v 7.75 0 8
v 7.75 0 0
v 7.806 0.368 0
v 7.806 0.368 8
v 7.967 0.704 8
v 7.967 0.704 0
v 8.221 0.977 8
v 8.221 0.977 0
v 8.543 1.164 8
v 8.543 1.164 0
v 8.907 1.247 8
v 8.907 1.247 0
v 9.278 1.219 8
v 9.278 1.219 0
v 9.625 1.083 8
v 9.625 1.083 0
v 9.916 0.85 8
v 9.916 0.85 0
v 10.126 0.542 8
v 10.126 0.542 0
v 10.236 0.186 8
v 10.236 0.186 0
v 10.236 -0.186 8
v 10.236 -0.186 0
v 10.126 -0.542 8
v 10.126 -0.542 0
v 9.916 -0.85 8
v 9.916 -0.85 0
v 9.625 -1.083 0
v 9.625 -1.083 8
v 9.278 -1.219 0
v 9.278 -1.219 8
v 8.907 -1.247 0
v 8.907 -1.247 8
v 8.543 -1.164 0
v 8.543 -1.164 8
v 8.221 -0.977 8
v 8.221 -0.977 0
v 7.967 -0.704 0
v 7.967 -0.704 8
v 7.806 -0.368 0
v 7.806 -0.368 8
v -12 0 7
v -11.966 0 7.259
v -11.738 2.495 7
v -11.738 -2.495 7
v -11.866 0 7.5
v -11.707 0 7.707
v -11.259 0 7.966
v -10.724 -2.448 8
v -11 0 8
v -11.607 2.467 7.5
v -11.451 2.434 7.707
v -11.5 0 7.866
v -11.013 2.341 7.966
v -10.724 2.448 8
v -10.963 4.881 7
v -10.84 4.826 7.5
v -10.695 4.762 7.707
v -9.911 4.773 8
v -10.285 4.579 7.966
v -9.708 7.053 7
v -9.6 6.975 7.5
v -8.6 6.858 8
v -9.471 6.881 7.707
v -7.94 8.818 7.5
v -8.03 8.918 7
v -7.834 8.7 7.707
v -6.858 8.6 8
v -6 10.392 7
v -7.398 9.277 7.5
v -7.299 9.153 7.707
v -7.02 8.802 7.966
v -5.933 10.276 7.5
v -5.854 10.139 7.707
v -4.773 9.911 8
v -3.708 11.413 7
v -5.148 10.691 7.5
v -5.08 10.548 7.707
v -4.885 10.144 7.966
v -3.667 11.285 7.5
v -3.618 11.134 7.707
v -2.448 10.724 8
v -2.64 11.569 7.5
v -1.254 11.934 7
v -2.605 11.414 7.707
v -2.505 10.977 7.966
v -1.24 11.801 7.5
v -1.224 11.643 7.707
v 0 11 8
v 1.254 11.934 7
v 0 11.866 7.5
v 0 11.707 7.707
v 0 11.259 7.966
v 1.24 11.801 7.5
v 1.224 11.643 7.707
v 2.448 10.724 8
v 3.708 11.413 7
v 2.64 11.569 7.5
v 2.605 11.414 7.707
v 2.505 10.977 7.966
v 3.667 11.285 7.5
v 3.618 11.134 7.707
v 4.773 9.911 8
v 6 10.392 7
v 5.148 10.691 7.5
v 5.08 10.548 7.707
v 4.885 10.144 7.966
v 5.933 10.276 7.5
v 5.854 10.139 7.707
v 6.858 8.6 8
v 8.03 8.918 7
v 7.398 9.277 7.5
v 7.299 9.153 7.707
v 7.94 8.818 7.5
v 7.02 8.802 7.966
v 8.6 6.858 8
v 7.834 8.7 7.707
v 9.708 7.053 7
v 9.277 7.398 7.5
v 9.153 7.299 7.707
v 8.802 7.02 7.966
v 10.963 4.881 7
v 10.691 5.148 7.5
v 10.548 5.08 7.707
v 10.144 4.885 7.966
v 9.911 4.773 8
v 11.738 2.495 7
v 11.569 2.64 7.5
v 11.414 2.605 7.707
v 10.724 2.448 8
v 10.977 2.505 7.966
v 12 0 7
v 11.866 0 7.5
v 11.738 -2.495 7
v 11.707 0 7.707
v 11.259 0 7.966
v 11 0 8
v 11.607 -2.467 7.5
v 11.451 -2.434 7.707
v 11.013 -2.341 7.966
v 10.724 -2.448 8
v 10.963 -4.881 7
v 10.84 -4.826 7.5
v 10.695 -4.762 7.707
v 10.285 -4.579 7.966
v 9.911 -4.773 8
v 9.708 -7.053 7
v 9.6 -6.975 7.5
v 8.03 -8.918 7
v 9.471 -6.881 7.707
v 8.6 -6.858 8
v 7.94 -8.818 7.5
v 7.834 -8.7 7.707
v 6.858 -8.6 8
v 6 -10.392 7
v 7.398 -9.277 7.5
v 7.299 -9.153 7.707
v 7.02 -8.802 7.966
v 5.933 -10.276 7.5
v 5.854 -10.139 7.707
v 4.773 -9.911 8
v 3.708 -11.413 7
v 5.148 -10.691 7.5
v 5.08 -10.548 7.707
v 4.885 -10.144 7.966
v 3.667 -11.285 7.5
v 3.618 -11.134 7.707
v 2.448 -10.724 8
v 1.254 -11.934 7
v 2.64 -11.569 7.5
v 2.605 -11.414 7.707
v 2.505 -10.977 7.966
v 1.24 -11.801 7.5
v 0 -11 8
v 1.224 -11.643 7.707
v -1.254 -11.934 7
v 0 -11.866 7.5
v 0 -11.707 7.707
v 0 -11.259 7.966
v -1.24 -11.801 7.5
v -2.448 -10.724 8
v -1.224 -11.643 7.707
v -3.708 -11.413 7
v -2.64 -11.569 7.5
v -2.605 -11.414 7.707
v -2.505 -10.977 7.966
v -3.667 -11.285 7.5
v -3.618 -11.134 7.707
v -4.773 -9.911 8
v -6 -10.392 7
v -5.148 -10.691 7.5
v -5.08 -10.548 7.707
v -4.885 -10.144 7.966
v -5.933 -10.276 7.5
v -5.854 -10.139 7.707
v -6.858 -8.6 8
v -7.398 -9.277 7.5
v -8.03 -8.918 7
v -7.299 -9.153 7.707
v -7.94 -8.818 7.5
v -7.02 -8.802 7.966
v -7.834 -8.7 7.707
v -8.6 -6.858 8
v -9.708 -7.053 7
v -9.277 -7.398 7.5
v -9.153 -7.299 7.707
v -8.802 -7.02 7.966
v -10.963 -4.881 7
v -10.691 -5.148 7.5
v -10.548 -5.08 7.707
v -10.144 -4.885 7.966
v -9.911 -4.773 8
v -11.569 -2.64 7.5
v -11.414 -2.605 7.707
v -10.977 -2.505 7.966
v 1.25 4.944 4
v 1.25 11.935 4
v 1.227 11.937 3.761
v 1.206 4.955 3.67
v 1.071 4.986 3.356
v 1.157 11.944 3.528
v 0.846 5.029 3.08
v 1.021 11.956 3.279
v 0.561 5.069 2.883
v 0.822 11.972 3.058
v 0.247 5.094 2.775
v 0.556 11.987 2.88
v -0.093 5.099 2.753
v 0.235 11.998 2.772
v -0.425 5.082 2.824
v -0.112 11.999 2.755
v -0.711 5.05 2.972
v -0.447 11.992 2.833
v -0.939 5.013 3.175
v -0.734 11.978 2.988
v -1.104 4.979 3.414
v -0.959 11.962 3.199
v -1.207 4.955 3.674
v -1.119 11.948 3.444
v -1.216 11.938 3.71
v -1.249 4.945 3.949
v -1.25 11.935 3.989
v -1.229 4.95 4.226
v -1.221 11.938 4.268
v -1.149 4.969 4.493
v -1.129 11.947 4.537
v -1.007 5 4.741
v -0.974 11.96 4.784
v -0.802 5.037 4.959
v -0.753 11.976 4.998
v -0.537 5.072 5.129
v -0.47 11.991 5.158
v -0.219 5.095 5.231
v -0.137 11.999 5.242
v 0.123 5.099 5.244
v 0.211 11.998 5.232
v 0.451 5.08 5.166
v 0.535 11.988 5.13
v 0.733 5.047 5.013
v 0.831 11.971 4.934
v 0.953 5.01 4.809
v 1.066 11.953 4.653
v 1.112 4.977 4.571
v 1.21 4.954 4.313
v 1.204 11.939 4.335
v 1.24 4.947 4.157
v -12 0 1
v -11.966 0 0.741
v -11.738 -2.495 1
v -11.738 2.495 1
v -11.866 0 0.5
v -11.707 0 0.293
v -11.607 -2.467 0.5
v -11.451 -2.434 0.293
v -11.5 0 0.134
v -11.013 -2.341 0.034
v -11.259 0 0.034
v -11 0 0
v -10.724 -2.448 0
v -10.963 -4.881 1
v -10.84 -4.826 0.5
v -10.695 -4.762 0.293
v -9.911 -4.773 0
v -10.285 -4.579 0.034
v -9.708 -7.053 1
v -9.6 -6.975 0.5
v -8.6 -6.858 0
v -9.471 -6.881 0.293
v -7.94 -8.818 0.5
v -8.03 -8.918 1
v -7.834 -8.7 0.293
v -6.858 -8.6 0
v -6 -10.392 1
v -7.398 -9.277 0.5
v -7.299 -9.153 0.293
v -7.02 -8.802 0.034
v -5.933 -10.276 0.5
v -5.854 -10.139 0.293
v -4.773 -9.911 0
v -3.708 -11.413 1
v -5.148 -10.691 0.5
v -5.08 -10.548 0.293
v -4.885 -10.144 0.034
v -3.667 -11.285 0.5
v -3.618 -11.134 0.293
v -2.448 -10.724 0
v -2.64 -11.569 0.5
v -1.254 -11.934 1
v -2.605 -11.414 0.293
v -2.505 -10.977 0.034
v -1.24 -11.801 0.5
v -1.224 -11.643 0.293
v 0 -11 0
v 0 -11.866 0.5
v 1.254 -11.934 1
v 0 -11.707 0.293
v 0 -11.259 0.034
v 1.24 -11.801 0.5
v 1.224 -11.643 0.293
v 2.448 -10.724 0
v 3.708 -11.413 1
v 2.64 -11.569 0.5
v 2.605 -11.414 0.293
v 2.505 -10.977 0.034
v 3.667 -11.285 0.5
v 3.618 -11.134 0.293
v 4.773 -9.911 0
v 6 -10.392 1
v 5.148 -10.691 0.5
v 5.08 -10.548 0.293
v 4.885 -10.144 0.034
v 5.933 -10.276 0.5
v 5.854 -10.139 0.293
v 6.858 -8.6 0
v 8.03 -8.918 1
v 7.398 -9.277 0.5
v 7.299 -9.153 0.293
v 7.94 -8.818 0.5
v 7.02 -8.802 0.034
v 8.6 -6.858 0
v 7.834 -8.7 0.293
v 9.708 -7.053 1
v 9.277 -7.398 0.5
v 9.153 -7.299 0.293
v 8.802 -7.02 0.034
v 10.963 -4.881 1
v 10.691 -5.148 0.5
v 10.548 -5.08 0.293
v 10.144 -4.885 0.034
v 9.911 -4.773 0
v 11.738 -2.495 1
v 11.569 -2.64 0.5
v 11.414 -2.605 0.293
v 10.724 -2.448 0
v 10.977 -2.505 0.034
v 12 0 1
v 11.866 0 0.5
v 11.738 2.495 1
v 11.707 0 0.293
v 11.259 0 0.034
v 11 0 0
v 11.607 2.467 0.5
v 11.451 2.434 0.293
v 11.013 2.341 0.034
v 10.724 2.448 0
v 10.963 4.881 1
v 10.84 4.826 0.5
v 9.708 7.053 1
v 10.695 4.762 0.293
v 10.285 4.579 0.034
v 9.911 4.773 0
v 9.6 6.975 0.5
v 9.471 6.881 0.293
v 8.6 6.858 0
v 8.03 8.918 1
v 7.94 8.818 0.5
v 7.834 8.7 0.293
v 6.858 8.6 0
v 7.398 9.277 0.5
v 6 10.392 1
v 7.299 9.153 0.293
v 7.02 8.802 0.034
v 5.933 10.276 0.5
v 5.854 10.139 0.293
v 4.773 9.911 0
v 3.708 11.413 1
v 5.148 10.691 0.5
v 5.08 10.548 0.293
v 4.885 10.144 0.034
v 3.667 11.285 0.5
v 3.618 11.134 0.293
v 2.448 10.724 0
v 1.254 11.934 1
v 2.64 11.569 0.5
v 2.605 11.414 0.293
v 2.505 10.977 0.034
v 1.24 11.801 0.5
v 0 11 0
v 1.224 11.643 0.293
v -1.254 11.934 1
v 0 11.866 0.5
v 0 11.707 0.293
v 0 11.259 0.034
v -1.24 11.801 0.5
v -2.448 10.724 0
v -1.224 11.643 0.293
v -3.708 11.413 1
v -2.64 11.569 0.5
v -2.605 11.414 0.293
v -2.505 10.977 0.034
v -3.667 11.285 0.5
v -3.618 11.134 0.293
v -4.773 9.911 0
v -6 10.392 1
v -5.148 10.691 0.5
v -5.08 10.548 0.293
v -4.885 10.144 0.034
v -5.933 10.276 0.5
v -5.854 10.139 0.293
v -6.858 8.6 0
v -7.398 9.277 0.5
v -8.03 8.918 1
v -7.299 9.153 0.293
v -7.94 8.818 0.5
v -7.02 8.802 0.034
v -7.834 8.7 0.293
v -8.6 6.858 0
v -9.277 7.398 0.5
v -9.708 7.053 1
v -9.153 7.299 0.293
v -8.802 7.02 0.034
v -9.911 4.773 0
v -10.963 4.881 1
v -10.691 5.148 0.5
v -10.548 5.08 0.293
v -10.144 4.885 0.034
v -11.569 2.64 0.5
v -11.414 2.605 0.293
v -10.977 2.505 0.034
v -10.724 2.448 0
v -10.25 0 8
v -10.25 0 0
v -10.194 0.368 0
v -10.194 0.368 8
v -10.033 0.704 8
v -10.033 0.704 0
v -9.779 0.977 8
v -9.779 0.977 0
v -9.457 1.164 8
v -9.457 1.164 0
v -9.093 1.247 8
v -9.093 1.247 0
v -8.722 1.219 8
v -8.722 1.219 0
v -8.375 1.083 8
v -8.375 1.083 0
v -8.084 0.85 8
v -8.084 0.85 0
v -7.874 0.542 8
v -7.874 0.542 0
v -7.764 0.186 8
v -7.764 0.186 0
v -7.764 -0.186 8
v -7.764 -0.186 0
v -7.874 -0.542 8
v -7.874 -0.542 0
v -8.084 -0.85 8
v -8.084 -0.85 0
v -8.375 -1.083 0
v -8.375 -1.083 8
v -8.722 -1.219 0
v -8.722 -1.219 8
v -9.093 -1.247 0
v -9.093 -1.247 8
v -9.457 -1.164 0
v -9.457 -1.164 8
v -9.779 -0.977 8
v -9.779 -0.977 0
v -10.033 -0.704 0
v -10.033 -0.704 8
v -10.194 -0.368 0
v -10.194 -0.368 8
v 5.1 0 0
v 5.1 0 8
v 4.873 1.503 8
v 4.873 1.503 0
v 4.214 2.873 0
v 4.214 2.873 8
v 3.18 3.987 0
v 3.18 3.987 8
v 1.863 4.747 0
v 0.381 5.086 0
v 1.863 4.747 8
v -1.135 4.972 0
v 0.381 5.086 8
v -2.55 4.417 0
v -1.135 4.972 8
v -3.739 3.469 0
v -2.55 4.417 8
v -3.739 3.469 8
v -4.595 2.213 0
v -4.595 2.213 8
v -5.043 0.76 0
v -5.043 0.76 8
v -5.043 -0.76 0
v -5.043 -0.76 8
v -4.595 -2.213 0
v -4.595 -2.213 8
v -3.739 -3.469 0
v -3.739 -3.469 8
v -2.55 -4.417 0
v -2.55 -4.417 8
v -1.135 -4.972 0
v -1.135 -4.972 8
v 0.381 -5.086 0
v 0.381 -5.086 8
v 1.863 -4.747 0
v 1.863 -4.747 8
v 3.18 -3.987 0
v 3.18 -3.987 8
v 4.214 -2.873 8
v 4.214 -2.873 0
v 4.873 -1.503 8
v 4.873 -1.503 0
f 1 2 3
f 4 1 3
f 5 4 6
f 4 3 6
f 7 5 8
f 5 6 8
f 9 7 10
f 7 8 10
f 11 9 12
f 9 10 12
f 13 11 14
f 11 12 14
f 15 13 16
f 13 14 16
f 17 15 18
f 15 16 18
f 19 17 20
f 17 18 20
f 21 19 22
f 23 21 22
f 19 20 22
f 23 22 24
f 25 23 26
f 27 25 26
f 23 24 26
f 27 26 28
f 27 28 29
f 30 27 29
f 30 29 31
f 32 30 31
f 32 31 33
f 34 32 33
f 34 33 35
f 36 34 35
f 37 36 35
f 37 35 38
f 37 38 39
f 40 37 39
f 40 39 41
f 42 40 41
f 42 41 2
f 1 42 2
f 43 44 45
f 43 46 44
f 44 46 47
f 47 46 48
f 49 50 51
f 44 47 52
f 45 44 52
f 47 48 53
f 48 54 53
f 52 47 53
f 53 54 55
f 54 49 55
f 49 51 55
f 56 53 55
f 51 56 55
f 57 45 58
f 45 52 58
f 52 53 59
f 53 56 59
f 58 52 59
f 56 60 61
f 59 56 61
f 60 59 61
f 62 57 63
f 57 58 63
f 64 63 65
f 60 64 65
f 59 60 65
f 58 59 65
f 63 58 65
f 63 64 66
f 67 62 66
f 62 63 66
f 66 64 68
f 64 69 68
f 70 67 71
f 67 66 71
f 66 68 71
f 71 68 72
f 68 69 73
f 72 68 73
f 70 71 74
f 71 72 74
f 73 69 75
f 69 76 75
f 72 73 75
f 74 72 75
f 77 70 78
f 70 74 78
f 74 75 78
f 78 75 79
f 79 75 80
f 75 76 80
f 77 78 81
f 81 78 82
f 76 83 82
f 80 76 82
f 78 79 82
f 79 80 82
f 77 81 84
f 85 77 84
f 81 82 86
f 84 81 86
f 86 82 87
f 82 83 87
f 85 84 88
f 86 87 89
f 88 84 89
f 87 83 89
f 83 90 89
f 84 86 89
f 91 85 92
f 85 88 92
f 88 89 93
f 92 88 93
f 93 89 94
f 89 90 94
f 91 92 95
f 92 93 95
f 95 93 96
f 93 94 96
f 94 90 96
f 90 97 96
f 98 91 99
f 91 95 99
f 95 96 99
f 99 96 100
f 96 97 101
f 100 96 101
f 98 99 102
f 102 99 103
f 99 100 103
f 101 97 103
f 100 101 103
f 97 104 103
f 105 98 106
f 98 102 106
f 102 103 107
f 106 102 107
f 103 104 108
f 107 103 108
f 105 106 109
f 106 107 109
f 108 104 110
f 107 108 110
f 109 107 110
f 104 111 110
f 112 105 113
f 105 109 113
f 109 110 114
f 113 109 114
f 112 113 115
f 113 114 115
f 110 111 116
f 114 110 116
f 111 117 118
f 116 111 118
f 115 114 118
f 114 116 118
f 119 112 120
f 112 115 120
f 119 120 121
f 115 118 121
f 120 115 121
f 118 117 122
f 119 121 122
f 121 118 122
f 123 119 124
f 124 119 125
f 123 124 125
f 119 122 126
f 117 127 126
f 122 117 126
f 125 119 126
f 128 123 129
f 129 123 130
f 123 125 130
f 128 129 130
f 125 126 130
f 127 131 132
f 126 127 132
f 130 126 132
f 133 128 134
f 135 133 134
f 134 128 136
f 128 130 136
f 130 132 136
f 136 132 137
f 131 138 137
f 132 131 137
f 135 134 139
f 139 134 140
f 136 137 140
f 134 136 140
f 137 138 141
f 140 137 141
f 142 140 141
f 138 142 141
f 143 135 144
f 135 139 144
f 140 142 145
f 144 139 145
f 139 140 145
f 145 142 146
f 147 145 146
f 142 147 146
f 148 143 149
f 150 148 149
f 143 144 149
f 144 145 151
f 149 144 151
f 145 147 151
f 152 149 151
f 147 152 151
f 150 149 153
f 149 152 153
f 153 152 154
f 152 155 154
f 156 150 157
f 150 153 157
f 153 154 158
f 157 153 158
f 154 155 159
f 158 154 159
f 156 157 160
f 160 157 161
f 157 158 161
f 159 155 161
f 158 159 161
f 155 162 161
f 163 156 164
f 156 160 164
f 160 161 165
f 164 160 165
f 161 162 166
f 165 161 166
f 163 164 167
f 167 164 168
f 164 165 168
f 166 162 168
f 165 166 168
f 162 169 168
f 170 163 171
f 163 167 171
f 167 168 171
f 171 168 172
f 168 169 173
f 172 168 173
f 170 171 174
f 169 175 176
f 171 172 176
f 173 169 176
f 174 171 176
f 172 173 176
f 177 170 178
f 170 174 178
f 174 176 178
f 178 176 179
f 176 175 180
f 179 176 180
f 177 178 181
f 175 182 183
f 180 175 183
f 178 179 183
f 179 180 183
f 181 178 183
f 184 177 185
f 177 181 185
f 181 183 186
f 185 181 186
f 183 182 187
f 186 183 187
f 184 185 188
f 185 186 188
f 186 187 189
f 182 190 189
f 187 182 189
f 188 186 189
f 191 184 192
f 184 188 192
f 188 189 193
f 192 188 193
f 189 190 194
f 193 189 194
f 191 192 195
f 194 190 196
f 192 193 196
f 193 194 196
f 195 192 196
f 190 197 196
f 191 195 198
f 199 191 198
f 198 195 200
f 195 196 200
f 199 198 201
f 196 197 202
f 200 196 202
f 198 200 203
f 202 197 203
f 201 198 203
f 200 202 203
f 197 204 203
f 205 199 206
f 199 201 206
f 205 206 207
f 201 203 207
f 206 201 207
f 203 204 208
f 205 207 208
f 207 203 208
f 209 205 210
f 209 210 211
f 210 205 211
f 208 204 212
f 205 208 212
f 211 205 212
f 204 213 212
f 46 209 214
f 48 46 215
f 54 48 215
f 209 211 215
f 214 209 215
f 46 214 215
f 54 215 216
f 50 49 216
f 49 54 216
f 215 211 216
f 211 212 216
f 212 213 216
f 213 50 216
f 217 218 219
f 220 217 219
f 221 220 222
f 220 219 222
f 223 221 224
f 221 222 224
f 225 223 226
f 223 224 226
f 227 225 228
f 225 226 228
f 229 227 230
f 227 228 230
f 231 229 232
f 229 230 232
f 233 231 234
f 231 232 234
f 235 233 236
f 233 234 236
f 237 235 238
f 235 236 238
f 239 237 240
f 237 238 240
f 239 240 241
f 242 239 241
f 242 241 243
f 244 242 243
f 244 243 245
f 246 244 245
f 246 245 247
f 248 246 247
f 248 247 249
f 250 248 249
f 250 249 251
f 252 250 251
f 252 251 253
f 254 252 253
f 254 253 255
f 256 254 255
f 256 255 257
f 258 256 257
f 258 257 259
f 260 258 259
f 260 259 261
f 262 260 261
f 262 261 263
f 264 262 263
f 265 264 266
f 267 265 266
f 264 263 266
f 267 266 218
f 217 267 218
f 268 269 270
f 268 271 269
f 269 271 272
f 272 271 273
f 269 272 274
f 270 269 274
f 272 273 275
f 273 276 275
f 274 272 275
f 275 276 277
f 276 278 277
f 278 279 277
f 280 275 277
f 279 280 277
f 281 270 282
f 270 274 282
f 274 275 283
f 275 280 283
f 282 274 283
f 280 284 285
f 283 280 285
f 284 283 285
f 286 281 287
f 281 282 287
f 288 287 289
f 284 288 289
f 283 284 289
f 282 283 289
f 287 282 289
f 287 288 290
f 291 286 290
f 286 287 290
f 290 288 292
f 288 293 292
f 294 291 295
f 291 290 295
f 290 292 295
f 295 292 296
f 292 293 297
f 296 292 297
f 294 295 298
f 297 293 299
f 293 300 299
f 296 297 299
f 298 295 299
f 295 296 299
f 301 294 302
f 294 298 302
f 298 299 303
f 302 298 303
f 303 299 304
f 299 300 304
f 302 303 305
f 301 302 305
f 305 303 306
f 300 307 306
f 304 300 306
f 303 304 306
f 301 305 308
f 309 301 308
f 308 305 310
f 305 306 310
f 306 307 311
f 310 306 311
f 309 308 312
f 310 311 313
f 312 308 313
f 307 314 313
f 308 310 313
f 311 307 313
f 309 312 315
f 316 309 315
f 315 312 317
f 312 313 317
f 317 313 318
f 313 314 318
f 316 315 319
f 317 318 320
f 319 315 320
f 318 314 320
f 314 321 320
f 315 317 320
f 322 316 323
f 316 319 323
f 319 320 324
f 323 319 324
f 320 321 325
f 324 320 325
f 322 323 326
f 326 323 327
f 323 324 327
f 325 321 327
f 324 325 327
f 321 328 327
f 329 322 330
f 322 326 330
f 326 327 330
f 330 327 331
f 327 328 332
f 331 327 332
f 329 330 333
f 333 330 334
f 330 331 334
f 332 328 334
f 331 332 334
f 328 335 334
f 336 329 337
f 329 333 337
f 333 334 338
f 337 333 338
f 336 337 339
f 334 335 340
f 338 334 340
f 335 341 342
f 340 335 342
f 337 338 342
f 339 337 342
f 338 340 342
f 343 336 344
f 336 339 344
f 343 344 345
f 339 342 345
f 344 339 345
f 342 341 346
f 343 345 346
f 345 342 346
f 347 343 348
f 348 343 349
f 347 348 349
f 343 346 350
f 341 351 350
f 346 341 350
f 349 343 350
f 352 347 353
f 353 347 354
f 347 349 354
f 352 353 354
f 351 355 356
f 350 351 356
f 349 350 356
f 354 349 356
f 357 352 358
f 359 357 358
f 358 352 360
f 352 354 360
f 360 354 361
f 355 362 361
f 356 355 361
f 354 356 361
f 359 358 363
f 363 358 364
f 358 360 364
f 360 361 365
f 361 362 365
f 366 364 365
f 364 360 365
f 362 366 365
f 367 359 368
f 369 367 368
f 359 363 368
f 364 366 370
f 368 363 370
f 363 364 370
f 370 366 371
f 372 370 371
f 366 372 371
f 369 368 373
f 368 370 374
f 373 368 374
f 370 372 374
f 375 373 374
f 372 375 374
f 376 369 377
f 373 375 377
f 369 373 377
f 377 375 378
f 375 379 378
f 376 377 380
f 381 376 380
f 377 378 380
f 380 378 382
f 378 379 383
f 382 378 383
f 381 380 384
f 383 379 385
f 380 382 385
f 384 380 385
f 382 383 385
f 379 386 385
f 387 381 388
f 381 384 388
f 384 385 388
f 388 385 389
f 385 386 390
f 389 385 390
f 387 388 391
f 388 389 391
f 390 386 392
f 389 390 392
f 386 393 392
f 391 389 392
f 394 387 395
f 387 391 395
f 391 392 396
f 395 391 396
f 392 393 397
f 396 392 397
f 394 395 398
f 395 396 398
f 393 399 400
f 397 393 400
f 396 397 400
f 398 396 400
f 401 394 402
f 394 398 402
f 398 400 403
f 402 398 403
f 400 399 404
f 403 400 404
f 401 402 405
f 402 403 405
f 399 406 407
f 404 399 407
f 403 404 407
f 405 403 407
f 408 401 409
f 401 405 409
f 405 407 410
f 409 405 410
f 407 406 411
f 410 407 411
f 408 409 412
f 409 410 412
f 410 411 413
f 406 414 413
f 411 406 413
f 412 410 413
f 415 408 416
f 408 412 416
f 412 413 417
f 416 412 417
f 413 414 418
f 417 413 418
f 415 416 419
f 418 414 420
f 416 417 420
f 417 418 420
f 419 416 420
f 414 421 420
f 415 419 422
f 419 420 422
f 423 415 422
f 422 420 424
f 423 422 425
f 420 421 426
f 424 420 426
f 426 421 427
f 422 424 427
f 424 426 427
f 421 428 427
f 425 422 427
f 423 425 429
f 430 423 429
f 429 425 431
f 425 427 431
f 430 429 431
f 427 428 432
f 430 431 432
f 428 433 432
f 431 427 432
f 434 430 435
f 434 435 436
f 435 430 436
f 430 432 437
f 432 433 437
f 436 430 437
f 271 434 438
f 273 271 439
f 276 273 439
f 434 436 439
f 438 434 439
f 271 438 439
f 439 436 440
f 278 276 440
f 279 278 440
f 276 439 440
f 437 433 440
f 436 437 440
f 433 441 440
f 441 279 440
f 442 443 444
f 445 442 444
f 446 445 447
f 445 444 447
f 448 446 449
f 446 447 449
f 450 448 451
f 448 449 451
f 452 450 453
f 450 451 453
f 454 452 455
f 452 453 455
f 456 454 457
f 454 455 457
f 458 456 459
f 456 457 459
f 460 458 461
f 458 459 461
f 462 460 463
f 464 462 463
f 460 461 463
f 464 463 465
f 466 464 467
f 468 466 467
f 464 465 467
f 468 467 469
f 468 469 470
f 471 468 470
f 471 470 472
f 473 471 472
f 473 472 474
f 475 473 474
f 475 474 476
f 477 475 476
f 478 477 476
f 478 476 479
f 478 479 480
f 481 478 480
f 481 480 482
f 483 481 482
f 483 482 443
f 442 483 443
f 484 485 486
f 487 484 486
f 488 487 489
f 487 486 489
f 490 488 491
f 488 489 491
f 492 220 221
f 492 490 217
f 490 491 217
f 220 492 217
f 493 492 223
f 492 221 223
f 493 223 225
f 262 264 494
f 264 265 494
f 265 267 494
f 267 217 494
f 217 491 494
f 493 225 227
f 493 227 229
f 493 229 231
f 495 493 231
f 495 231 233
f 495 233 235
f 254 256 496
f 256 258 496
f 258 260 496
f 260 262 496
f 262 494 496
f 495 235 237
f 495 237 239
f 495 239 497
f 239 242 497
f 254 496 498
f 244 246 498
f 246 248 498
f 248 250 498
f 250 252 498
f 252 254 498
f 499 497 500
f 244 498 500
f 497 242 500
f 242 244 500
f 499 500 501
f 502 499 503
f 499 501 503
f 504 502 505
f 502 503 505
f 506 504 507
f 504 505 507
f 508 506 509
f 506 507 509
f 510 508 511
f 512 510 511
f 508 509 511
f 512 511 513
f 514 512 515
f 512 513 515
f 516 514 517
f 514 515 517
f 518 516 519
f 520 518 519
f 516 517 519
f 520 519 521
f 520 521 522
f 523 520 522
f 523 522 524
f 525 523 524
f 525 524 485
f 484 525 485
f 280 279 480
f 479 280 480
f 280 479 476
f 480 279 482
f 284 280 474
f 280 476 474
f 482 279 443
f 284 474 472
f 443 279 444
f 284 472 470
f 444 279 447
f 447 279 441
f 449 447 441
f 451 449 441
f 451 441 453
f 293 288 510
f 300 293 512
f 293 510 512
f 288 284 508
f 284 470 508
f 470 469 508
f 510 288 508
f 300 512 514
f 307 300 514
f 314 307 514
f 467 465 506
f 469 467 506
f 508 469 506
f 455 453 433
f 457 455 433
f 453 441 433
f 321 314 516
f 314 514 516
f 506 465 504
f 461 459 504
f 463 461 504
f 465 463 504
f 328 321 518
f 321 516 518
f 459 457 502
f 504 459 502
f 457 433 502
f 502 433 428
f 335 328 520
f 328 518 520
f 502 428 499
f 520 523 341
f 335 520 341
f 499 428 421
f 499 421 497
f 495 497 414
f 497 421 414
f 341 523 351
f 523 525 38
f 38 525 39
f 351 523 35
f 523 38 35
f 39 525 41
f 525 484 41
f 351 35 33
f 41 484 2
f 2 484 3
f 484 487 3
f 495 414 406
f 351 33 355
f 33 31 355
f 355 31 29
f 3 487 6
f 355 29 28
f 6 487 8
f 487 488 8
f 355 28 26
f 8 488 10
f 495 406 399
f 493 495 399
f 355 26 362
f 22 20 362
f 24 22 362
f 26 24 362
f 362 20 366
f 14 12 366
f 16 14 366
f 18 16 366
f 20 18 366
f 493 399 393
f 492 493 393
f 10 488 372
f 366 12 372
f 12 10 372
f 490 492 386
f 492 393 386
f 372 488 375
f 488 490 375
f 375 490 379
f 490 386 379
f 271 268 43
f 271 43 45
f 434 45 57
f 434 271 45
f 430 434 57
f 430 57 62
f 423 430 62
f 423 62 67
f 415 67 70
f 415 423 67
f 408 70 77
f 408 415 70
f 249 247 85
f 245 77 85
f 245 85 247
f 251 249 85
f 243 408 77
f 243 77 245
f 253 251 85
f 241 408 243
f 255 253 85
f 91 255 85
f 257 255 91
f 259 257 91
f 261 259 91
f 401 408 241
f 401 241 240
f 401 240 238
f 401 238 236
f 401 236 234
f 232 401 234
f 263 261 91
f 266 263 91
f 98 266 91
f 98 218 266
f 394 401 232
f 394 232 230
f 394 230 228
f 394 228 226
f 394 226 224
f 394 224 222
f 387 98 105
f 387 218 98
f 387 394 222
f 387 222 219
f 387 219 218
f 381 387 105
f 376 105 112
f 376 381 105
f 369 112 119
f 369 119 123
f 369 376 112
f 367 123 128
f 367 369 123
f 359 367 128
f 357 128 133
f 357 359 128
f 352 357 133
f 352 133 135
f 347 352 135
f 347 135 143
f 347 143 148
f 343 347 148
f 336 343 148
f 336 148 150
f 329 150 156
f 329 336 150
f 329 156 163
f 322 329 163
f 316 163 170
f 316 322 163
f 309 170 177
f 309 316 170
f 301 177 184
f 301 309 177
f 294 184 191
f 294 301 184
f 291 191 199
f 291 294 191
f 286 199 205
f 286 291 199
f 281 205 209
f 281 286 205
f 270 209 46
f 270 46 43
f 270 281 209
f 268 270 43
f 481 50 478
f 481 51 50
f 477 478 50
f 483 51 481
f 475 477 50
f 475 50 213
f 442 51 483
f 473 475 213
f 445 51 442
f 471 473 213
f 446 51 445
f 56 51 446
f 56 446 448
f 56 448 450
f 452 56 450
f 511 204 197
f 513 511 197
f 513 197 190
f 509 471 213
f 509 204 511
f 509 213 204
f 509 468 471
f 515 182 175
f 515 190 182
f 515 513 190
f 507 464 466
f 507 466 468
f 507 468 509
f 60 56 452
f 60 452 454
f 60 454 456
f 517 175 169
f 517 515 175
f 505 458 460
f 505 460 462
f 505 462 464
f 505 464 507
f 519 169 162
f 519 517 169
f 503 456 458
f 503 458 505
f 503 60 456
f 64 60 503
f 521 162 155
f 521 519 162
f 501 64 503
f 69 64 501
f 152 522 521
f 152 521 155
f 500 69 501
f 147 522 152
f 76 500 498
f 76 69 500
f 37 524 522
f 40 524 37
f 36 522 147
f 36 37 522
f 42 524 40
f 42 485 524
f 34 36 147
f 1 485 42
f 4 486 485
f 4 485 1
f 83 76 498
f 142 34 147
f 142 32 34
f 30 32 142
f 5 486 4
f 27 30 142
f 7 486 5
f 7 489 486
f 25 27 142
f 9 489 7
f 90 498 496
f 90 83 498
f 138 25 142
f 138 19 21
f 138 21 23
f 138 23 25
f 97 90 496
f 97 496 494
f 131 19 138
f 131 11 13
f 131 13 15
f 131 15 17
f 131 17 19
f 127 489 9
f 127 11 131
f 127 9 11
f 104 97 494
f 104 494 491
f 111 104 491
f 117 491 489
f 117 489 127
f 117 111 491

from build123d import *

# Parameters (mm, degrees)
SKETCH1_W                    = 24
SKETCH1_H                    = 24
BOSS_EXTRUDE1_DEPTH          = 8
M3_TAPPED_HOLE1_D            = 2.5
F_10_2_10_2_DIAMETER_HOLE1_D = 10.2
M3_TAPPED_HOLE2_REACH        = 30
M3_TAPPED_HOLE2_BORE_R       = 1.25
SKETCH15_R                   = 18.5
SKETCH15_R_2                 = 12
CUT_EXTRUDE2_DEPTH           = 10
FILLET2_R                    = 1


with BuildPart() as part:
    # Sketch1 → Boss-Extrude1 (new body)
    with BuildSketch(Plane.XY):
        Rectangle(SKETCH1_W, SKETCH1_H)
    extrude(amount=BOSS_EXTRUDE1_DEPTH)

    # M3 Tapped Hole1 (through all)
    with Locations(Plane.XY.offset(8)):
        with Locations((9, 0), (-9, 0)):
            Hole(M3_TAPPED_HOLE1_D / 2)

    # Ø10.2 (10.2) Diameter Hole1 (through all)
    with Locations(Plane(origin=(0, 0, 0), x_dir=(-1, 0, 0), z_dir=(0, 0, -1))):
        with Locations((0, 0)):
            Hole(F_10_2_10_2_DIAMETER_HOLE1_D / 2)

    # M3 Tapped Hole2 bore → M3 Tapped Hole2 (cut, up to next)
    with BuildSketch(Plane(origin=(0, 12, 0), x_dir=(1, 0, 0), z_dir=(0, 1, 0)), mode=Mode.PRIVATE) as m3_tapped_hole2_sk1:
        with Locations((0, -4)):
            Circle(M3_TAPPED_HOLE2_BORE_R)
    m3_tapped_hole2_tool1 = extrude(m3_tapped_hole2_sk1.sketch, amount=-M3_TAPPED_HOLE2_REACH, mode=Mode.PRIVATE) & part.part
    add(m3_tapped_hole2_tool1.solids().sort_by_distance((0, 12, 4))[0], mode=Mode.SUBTRACT)

    # Sketch15 → Cut-Extrude2 (cut)
    with BuildSketch(Plane(origin=(0, 0, 0), x_dir=(-1, 0, 0), z_dir=(0, 0, -1))):
        Circle(SKETCH15_R)
        Circle(SKETCH15_R_2, mode=Mode.SUBTRACT)
    extrude(amount=-CUT_EXTRUDE2_DEPTH, mode=Mode.SUBTRACT)

    # Fillet2
    fillet2_edges = [part.edges().sort_by_distance(p)[0] for p in [
        (12, 0, 0),
        (12, 0, 8),
    ]]
    fillet(fillet2_edges, radius=FILLET2_R)


solid = part.part
